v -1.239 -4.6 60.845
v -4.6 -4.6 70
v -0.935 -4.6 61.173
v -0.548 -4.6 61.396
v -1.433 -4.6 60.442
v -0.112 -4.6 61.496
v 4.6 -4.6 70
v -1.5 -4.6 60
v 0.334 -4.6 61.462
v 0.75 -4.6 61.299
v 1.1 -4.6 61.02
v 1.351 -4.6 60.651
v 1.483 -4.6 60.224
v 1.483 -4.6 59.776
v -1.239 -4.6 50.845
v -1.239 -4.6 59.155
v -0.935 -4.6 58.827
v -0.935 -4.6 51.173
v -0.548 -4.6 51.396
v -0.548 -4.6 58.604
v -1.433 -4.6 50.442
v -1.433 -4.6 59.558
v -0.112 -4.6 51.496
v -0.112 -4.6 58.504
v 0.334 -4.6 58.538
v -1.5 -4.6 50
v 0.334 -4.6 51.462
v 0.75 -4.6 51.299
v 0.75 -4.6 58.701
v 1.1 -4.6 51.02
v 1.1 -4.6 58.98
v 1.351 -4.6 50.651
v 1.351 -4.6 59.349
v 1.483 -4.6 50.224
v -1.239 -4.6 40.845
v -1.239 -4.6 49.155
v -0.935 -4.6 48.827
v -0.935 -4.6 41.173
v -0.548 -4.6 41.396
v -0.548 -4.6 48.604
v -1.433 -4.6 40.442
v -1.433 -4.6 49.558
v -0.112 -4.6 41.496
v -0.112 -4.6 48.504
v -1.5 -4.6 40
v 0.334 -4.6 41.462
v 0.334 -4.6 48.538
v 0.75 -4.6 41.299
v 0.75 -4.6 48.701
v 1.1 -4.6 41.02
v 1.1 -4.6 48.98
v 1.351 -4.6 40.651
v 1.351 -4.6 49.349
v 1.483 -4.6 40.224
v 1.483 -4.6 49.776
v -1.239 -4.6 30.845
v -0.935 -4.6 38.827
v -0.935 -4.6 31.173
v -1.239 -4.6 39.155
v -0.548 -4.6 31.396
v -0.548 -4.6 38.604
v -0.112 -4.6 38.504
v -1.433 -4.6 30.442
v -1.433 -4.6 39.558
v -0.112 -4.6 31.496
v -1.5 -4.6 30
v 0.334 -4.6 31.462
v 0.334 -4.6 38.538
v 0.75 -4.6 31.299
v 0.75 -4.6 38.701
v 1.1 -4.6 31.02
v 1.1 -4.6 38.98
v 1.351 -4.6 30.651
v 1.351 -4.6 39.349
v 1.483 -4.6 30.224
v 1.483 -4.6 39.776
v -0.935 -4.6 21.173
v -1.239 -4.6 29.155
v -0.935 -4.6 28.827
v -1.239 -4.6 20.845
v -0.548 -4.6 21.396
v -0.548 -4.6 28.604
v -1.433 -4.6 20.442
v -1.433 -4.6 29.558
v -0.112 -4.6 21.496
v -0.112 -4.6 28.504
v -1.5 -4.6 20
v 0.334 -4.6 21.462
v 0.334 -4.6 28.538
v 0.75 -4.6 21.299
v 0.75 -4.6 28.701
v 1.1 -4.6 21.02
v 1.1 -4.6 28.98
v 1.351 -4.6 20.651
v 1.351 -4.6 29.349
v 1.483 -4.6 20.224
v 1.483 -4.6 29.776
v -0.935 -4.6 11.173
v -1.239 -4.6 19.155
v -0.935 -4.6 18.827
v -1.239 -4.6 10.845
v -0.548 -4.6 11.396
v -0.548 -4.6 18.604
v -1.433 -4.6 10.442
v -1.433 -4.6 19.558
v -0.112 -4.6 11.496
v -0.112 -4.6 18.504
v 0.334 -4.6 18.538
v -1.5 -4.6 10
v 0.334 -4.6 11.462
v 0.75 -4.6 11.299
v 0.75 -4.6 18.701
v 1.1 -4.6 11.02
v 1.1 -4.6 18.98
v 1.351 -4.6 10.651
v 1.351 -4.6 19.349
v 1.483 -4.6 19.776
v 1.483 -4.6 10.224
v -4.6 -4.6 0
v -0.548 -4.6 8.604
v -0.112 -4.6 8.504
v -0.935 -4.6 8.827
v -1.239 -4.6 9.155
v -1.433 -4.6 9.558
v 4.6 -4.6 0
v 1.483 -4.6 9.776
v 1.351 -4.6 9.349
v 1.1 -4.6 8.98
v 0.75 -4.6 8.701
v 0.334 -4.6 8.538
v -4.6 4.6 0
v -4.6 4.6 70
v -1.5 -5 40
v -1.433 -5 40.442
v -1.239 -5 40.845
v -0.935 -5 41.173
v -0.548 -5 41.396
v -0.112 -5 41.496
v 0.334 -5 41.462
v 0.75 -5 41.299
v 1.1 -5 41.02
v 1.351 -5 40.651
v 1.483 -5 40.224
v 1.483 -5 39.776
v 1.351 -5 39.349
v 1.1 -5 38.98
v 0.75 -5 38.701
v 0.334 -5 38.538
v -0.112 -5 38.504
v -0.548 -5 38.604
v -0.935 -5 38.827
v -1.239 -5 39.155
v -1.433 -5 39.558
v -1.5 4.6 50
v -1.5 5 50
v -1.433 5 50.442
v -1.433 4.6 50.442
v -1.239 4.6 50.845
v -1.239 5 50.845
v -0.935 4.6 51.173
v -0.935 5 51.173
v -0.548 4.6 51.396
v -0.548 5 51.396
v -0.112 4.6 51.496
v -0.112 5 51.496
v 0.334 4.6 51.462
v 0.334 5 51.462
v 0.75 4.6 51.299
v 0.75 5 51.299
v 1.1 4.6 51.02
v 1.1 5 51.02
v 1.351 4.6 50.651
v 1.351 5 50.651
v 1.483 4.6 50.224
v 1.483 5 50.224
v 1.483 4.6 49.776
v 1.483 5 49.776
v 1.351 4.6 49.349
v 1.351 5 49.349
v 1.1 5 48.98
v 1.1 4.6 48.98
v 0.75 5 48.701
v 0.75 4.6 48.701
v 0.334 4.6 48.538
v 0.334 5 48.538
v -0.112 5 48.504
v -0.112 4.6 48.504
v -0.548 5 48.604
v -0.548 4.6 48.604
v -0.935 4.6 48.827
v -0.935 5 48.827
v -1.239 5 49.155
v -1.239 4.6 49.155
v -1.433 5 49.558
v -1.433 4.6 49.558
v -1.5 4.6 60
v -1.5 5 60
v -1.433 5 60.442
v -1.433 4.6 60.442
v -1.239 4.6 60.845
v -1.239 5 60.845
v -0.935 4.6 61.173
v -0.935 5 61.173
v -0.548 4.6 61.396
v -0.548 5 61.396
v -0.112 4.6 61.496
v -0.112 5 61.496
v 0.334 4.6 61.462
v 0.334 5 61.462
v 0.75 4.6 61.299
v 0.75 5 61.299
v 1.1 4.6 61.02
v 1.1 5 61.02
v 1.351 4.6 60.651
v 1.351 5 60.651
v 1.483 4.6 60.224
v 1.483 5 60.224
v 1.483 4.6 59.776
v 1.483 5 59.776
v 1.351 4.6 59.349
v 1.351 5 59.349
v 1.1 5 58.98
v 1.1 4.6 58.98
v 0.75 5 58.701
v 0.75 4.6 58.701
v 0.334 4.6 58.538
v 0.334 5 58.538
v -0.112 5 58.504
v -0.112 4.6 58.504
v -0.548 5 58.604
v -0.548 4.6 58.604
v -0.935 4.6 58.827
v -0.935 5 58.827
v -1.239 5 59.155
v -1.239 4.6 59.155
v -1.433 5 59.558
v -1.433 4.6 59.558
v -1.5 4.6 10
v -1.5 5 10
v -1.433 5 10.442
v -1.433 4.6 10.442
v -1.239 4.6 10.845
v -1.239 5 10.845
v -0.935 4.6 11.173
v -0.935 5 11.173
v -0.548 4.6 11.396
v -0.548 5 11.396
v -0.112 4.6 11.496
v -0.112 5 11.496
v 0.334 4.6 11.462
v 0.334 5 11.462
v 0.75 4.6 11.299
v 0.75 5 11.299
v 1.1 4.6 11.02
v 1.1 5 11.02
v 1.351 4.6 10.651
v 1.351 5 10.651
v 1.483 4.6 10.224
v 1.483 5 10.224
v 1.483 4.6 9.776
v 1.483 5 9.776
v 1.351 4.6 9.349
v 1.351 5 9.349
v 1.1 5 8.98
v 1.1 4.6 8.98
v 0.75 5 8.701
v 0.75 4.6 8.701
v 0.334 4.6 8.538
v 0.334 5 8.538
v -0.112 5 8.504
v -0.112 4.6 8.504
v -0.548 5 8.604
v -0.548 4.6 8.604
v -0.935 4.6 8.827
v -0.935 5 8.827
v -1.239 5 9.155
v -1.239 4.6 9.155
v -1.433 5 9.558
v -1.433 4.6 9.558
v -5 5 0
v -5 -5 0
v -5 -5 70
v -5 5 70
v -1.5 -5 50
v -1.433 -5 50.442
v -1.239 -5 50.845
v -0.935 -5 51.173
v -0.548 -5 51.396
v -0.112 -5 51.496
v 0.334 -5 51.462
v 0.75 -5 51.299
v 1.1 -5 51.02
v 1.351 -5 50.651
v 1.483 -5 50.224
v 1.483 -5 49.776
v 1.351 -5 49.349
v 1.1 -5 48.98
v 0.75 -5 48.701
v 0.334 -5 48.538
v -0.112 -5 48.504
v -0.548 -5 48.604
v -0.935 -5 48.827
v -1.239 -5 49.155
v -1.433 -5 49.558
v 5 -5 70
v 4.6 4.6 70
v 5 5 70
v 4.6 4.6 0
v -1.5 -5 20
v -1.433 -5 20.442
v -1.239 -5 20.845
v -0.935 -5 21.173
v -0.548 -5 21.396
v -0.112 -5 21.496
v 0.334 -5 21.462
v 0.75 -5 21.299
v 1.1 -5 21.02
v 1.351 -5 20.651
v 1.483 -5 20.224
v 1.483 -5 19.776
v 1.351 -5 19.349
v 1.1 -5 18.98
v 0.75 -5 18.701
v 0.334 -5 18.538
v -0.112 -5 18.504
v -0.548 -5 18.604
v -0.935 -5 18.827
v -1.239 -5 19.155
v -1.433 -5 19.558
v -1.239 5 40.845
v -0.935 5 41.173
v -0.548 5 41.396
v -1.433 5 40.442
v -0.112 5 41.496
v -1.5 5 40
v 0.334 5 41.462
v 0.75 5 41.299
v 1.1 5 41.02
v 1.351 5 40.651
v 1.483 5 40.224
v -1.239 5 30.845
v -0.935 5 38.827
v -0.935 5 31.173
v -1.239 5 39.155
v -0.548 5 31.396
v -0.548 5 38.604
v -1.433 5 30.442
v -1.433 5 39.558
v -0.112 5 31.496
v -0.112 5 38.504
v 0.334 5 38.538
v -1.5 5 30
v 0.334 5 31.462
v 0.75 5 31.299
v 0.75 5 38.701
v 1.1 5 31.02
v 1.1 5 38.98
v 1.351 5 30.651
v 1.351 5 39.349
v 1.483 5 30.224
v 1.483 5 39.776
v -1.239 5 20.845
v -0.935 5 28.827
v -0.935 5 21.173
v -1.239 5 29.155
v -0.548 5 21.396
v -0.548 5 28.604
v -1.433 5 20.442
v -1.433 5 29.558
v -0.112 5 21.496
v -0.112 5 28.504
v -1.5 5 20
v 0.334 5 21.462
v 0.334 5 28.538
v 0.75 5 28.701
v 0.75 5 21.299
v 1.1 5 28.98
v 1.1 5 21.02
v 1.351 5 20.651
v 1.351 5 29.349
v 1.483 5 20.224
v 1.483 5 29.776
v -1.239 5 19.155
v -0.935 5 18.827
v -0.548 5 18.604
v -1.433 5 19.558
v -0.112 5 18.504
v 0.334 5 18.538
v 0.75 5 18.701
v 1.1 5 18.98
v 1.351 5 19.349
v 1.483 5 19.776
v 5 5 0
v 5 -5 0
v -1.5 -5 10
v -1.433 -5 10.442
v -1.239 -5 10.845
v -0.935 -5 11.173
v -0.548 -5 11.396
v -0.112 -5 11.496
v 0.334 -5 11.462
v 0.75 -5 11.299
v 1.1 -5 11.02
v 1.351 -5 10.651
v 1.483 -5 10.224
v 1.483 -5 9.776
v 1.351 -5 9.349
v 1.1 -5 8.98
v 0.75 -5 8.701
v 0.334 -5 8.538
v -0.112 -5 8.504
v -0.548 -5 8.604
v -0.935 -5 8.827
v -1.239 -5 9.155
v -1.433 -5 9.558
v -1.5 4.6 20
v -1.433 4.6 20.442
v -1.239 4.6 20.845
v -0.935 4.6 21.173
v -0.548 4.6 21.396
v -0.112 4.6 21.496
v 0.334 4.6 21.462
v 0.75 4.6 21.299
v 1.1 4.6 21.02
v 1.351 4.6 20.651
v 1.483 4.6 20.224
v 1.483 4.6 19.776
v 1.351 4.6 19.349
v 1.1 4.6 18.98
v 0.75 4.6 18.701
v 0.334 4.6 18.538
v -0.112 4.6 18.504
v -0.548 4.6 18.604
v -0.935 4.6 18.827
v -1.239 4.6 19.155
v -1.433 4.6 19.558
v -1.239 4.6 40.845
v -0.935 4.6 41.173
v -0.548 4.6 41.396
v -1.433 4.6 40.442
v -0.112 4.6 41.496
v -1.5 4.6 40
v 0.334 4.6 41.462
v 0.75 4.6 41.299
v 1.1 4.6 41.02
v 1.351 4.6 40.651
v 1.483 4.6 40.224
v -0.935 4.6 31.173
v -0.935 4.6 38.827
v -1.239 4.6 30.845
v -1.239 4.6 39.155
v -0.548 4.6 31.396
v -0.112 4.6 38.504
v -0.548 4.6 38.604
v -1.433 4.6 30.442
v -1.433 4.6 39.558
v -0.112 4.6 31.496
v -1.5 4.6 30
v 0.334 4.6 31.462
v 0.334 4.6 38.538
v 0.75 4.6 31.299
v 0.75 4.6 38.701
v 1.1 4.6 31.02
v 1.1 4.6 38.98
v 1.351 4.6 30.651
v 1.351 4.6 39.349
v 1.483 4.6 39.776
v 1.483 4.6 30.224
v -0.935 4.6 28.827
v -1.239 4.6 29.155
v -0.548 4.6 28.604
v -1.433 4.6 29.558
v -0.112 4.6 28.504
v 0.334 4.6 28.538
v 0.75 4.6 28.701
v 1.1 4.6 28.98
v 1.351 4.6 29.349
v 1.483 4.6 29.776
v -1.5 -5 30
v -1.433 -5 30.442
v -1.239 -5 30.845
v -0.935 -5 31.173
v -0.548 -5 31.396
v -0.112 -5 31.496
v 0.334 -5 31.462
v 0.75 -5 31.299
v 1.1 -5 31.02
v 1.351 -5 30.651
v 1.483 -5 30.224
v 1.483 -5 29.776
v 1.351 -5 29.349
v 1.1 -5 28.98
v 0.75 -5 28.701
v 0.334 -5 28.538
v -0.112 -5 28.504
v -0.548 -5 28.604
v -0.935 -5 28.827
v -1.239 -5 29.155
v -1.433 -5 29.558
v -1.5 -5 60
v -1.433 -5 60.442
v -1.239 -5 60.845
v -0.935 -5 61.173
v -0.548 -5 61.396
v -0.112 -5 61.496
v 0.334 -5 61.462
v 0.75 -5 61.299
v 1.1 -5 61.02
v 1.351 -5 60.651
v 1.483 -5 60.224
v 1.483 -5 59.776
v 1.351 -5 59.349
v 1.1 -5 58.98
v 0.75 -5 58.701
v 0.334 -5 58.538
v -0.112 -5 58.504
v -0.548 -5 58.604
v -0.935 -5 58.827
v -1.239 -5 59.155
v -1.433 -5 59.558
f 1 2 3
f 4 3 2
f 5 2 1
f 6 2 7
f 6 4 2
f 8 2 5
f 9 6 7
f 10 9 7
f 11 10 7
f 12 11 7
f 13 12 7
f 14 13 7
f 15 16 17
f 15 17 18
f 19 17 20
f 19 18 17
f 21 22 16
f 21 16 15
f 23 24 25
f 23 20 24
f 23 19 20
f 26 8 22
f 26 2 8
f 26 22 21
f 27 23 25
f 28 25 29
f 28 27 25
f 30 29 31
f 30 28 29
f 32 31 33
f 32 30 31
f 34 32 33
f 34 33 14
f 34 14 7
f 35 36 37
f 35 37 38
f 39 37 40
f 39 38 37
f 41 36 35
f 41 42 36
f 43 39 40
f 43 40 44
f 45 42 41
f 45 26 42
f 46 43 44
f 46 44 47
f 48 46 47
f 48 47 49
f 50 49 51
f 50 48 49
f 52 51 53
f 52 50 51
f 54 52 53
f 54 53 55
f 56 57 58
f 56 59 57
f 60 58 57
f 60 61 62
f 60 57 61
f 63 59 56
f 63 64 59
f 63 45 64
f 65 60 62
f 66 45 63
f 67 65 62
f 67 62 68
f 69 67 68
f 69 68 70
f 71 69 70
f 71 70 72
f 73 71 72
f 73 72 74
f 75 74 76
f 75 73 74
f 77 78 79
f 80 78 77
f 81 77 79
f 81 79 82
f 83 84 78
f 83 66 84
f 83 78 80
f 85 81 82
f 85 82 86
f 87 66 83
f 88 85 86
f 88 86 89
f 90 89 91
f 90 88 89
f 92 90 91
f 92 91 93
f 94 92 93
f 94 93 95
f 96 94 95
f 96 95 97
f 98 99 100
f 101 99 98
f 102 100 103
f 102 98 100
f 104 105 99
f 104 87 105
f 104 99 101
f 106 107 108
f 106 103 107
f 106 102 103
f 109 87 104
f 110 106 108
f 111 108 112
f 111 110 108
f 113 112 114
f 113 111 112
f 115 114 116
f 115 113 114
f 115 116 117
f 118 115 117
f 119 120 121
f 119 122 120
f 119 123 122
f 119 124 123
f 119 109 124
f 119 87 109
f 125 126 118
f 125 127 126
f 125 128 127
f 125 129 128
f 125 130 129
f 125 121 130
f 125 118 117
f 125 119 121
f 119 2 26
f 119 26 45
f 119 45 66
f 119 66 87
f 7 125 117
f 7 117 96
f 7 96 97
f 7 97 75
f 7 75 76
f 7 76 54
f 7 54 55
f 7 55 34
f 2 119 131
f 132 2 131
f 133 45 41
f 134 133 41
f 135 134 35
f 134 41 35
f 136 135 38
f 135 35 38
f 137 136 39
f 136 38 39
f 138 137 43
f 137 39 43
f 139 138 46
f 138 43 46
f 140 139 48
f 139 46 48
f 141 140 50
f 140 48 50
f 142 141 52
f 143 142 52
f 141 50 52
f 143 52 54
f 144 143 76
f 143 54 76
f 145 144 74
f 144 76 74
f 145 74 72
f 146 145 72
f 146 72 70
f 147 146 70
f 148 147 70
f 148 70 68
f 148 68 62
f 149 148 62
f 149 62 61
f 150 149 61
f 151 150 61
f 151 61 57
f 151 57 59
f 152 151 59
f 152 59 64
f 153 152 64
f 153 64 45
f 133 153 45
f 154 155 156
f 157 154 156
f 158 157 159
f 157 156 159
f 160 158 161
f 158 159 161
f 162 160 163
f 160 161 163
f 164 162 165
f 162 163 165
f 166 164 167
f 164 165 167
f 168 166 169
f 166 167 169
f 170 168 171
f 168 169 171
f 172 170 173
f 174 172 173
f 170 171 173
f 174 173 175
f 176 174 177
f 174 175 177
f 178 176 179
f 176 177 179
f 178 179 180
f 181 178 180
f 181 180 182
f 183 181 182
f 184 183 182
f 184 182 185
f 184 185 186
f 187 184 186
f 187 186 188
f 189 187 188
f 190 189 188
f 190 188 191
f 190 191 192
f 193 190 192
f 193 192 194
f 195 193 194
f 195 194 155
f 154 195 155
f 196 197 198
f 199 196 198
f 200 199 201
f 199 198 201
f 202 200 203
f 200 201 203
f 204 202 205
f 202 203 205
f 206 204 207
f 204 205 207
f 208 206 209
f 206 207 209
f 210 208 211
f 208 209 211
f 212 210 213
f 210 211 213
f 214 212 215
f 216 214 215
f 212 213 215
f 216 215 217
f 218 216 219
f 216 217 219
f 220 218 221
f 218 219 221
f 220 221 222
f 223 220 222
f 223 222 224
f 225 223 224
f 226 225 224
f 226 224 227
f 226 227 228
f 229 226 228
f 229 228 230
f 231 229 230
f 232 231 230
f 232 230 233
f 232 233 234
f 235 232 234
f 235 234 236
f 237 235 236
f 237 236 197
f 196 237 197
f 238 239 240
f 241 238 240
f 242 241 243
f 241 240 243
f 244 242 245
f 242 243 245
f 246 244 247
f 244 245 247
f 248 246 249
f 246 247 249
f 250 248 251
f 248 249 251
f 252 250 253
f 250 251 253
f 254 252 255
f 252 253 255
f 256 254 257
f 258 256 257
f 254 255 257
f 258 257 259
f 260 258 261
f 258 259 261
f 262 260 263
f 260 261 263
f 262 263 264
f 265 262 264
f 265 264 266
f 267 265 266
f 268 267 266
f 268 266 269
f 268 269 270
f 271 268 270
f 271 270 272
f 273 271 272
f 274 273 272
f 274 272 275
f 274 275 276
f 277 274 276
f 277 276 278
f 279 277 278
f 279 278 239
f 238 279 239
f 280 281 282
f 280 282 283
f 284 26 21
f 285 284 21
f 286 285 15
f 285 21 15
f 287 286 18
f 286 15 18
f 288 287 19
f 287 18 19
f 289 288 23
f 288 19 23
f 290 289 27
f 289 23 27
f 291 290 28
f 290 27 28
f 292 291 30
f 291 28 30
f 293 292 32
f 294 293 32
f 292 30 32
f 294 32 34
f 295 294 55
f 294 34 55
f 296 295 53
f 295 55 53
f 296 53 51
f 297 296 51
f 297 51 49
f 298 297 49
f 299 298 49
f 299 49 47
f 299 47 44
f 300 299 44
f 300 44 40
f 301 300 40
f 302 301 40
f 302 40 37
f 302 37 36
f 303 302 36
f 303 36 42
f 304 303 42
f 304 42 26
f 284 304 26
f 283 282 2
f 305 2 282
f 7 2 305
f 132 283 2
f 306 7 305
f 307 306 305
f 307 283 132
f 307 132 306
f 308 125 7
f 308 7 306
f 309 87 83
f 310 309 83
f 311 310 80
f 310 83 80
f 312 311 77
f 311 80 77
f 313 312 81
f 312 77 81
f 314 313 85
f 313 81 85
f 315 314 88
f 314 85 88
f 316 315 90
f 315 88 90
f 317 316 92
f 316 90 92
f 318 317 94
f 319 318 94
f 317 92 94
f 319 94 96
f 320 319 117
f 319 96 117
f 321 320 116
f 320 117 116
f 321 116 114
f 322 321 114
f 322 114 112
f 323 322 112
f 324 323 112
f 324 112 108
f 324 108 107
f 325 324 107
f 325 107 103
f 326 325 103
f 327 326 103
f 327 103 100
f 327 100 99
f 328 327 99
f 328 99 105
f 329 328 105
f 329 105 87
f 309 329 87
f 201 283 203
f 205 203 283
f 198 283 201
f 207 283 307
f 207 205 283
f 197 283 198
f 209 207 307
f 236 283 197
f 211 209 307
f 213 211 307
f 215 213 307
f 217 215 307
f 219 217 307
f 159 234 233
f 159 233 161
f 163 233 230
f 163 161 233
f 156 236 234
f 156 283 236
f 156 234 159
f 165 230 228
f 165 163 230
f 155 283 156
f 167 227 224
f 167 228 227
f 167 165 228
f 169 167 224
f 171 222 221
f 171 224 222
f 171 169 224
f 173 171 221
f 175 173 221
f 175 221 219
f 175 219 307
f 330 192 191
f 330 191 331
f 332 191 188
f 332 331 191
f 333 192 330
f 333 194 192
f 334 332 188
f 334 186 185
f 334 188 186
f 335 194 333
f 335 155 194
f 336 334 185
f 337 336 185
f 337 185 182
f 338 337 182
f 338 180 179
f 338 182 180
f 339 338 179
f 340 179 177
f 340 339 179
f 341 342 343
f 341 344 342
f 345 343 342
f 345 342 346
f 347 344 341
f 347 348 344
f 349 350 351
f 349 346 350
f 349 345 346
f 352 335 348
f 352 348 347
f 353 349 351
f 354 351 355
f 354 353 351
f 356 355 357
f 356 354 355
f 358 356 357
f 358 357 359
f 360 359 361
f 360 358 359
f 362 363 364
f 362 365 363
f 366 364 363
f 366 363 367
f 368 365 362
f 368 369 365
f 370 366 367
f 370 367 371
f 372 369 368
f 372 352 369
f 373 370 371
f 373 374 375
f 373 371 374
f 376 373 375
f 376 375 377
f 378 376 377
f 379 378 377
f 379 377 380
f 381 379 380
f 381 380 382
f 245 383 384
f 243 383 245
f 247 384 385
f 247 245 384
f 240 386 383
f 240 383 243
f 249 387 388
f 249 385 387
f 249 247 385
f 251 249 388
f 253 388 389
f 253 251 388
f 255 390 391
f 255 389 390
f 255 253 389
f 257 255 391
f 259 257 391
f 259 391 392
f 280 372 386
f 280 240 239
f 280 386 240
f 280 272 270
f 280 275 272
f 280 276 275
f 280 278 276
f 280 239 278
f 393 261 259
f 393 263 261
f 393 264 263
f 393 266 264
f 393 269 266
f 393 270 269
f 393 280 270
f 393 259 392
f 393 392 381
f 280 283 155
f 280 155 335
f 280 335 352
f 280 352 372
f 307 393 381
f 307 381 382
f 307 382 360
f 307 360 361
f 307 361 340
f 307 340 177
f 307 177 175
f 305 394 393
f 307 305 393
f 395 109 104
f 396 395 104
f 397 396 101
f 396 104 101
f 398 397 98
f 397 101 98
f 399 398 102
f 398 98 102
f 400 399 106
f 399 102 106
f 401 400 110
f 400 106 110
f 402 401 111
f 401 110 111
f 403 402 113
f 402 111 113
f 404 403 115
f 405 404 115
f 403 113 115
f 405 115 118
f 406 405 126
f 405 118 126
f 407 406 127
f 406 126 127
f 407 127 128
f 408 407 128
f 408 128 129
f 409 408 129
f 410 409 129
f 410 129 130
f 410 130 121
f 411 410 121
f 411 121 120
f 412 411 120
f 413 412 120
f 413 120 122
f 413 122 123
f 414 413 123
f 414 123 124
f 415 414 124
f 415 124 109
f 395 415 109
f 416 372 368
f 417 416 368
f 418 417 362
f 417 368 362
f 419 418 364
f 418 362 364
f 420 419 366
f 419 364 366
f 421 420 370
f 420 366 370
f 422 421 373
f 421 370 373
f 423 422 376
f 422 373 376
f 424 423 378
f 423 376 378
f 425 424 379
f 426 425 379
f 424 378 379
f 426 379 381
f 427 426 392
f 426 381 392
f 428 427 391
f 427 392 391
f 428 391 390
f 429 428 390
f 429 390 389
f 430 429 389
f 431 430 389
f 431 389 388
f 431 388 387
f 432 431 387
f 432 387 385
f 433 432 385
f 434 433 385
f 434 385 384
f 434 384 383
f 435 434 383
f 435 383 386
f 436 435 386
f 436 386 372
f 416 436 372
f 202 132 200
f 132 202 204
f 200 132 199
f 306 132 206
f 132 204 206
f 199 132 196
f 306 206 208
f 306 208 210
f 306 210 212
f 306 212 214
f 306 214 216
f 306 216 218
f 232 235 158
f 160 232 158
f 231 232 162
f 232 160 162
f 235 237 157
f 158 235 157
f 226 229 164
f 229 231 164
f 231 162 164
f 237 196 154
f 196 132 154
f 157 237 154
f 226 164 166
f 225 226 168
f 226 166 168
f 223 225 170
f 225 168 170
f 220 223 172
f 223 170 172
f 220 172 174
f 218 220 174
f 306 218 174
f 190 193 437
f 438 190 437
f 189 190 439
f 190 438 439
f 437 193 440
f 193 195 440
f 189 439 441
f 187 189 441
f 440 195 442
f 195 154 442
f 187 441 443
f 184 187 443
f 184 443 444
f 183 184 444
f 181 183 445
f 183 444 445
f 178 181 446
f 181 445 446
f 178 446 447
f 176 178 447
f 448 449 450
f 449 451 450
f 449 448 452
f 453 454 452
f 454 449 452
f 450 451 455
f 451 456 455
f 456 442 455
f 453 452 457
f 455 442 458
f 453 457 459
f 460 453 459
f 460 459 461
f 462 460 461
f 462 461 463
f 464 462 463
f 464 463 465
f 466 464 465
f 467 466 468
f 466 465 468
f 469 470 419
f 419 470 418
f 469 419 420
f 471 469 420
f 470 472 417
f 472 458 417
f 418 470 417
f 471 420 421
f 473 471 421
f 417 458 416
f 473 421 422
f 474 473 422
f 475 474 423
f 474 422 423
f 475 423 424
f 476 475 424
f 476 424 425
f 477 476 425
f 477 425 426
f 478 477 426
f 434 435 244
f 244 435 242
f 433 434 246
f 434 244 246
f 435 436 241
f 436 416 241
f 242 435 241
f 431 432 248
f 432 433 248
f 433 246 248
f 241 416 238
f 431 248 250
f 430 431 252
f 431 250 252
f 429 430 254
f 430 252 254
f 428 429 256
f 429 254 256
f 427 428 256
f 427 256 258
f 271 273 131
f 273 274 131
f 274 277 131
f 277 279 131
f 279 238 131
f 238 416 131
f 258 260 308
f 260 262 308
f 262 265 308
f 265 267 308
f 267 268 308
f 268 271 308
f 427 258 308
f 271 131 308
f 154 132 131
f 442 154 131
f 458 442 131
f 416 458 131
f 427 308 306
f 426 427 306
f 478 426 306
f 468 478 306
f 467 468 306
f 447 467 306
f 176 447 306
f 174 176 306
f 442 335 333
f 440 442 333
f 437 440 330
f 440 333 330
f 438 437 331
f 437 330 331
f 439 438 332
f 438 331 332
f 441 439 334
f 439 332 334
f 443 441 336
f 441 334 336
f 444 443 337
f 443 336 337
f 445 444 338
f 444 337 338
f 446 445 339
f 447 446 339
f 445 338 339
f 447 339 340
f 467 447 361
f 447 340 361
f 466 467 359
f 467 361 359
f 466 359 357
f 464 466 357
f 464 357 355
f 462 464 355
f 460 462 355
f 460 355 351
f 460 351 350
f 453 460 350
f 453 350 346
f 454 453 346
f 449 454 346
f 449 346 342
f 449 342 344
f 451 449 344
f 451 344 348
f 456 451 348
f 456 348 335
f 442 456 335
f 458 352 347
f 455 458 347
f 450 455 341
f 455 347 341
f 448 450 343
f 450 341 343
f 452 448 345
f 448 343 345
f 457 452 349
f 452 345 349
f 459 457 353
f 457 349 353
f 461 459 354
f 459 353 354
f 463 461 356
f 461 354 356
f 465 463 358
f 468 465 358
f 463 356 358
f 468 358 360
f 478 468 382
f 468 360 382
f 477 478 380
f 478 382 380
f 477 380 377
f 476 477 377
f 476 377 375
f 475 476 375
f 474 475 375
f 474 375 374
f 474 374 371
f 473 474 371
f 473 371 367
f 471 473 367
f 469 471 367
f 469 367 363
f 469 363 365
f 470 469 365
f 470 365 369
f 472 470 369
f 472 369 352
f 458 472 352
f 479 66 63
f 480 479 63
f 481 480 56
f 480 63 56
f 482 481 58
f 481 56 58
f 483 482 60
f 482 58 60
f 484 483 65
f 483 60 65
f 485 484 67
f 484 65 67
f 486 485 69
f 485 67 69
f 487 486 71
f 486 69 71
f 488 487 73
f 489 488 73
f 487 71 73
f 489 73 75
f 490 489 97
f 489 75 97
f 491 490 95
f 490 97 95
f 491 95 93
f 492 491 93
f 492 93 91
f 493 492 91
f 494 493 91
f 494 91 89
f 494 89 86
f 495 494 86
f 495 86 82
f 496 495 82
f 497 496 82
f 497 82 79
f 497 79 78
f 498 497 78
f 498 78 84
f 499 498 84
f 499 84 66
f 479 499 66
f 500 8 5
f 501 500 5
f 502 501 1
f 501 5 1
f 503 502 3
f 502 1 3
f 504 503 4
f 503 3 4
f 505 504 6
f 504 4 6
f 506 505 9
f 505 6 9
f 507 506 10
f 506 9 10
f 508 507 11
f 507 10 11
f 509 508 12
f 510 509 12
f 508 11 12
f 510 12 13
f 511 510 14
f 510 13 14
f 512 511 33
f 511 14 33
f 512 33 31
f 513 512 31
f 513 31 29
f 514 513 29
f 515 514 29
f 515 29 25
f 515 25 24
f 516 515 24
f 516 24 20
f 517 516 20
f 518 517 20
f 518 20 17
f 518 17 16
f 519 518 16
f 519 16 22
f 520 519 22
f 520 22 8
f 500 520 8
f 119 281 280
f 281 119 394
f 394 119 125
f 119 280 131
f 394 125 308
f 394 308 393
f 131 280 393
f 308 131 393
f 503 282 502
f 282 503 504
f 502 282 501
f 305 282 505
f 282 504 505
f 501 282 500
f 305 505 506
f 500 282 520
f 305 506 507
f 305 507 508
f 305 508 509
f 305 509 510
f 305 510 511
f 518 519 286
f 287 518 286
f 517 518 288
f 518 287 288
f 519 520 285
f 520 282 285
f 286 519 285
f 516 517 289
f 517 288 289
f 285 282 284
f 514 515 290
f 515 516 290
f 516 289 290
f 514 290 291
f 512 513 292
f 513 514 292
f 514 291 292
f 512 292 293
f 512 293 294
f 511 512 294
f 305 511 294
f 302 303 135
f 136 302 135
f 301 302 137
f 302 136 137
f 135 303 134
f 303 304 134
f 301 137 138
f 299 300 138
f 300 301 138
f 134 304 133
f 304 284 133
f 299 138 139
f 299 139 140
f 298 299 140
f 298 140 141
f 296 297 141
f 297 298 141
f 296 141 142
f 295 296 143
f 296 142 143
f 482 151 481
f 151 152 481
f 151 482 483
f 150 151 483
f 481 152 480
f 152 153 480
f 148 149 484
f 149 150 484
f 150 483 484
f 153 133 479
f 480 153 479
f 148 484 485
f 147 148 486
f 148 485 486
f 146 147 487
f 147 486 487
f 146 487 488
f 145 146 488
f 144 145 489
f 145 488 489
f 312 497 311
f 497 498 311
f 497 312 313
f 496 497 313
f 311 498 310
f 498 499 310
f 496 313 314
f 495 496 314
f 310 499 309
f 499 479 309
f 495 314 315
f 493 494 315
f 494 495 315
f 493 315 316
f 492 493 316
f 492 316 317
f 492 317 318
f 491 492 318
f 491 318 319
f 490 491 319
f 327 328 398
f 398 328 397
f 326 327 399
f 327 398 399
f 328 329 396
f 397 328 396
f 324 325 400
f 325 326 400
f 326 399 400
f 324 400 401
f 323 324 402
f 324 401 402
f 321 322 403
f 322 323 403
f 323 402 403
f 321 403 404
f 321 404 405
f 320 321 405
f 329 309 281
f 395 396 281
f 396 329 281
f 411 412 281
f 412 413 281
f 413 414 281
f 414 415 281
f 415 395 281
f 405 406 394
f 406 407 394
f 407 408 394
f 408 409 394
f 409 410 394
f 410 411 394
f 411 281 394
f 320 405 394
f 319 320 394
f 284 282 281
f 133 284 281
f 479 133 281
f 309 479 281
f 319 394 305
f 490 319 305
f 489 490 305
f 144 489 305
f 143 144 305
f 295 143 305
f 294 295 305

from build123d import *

# Parameters (mm, degrees)
F0_W     = 10
F0_H     = 10
F0_W_2   = 9.2
F0_H_2   = 9.2
F1_DEPTH = 70
F2_R     = 1.5
F3_DEPTH = 25


with BuildPart() as f1:
    # F0 (on Top) → F1 (new body)
    with BuildSketch(Plane.XY):
        Rectangle(F0_W, F0_H)
        Rectangle(F0_W_2, F0_H_2, mode=Mode.SUBTRACT)
    extrude(amount=F1_DEPTH)

    # F2 (on face) → F3 (cut)
    with BuildSketch(Plane(origin=(0, 5, 0), x_dir=(-1, 0, 0), z_dir=(0, 1, 0))):
        with Locations((0, 60)):
            Circle(F2_R)
        with Locations((0, 50)):
            Circle(F2_R)
        with Locations((0, 40)):
            Circle(F2_R)
        with Locations((0, 30)):
            Circle(F2_R)
        with Locations((0, 20)):
            Circle(F2_R)
        with Locations((0, 10)):
            Circle(F2_R)
    extrude(amount=-F3_DEPTH, mode=Mode.SUBTRACT)


solid = f1.part
